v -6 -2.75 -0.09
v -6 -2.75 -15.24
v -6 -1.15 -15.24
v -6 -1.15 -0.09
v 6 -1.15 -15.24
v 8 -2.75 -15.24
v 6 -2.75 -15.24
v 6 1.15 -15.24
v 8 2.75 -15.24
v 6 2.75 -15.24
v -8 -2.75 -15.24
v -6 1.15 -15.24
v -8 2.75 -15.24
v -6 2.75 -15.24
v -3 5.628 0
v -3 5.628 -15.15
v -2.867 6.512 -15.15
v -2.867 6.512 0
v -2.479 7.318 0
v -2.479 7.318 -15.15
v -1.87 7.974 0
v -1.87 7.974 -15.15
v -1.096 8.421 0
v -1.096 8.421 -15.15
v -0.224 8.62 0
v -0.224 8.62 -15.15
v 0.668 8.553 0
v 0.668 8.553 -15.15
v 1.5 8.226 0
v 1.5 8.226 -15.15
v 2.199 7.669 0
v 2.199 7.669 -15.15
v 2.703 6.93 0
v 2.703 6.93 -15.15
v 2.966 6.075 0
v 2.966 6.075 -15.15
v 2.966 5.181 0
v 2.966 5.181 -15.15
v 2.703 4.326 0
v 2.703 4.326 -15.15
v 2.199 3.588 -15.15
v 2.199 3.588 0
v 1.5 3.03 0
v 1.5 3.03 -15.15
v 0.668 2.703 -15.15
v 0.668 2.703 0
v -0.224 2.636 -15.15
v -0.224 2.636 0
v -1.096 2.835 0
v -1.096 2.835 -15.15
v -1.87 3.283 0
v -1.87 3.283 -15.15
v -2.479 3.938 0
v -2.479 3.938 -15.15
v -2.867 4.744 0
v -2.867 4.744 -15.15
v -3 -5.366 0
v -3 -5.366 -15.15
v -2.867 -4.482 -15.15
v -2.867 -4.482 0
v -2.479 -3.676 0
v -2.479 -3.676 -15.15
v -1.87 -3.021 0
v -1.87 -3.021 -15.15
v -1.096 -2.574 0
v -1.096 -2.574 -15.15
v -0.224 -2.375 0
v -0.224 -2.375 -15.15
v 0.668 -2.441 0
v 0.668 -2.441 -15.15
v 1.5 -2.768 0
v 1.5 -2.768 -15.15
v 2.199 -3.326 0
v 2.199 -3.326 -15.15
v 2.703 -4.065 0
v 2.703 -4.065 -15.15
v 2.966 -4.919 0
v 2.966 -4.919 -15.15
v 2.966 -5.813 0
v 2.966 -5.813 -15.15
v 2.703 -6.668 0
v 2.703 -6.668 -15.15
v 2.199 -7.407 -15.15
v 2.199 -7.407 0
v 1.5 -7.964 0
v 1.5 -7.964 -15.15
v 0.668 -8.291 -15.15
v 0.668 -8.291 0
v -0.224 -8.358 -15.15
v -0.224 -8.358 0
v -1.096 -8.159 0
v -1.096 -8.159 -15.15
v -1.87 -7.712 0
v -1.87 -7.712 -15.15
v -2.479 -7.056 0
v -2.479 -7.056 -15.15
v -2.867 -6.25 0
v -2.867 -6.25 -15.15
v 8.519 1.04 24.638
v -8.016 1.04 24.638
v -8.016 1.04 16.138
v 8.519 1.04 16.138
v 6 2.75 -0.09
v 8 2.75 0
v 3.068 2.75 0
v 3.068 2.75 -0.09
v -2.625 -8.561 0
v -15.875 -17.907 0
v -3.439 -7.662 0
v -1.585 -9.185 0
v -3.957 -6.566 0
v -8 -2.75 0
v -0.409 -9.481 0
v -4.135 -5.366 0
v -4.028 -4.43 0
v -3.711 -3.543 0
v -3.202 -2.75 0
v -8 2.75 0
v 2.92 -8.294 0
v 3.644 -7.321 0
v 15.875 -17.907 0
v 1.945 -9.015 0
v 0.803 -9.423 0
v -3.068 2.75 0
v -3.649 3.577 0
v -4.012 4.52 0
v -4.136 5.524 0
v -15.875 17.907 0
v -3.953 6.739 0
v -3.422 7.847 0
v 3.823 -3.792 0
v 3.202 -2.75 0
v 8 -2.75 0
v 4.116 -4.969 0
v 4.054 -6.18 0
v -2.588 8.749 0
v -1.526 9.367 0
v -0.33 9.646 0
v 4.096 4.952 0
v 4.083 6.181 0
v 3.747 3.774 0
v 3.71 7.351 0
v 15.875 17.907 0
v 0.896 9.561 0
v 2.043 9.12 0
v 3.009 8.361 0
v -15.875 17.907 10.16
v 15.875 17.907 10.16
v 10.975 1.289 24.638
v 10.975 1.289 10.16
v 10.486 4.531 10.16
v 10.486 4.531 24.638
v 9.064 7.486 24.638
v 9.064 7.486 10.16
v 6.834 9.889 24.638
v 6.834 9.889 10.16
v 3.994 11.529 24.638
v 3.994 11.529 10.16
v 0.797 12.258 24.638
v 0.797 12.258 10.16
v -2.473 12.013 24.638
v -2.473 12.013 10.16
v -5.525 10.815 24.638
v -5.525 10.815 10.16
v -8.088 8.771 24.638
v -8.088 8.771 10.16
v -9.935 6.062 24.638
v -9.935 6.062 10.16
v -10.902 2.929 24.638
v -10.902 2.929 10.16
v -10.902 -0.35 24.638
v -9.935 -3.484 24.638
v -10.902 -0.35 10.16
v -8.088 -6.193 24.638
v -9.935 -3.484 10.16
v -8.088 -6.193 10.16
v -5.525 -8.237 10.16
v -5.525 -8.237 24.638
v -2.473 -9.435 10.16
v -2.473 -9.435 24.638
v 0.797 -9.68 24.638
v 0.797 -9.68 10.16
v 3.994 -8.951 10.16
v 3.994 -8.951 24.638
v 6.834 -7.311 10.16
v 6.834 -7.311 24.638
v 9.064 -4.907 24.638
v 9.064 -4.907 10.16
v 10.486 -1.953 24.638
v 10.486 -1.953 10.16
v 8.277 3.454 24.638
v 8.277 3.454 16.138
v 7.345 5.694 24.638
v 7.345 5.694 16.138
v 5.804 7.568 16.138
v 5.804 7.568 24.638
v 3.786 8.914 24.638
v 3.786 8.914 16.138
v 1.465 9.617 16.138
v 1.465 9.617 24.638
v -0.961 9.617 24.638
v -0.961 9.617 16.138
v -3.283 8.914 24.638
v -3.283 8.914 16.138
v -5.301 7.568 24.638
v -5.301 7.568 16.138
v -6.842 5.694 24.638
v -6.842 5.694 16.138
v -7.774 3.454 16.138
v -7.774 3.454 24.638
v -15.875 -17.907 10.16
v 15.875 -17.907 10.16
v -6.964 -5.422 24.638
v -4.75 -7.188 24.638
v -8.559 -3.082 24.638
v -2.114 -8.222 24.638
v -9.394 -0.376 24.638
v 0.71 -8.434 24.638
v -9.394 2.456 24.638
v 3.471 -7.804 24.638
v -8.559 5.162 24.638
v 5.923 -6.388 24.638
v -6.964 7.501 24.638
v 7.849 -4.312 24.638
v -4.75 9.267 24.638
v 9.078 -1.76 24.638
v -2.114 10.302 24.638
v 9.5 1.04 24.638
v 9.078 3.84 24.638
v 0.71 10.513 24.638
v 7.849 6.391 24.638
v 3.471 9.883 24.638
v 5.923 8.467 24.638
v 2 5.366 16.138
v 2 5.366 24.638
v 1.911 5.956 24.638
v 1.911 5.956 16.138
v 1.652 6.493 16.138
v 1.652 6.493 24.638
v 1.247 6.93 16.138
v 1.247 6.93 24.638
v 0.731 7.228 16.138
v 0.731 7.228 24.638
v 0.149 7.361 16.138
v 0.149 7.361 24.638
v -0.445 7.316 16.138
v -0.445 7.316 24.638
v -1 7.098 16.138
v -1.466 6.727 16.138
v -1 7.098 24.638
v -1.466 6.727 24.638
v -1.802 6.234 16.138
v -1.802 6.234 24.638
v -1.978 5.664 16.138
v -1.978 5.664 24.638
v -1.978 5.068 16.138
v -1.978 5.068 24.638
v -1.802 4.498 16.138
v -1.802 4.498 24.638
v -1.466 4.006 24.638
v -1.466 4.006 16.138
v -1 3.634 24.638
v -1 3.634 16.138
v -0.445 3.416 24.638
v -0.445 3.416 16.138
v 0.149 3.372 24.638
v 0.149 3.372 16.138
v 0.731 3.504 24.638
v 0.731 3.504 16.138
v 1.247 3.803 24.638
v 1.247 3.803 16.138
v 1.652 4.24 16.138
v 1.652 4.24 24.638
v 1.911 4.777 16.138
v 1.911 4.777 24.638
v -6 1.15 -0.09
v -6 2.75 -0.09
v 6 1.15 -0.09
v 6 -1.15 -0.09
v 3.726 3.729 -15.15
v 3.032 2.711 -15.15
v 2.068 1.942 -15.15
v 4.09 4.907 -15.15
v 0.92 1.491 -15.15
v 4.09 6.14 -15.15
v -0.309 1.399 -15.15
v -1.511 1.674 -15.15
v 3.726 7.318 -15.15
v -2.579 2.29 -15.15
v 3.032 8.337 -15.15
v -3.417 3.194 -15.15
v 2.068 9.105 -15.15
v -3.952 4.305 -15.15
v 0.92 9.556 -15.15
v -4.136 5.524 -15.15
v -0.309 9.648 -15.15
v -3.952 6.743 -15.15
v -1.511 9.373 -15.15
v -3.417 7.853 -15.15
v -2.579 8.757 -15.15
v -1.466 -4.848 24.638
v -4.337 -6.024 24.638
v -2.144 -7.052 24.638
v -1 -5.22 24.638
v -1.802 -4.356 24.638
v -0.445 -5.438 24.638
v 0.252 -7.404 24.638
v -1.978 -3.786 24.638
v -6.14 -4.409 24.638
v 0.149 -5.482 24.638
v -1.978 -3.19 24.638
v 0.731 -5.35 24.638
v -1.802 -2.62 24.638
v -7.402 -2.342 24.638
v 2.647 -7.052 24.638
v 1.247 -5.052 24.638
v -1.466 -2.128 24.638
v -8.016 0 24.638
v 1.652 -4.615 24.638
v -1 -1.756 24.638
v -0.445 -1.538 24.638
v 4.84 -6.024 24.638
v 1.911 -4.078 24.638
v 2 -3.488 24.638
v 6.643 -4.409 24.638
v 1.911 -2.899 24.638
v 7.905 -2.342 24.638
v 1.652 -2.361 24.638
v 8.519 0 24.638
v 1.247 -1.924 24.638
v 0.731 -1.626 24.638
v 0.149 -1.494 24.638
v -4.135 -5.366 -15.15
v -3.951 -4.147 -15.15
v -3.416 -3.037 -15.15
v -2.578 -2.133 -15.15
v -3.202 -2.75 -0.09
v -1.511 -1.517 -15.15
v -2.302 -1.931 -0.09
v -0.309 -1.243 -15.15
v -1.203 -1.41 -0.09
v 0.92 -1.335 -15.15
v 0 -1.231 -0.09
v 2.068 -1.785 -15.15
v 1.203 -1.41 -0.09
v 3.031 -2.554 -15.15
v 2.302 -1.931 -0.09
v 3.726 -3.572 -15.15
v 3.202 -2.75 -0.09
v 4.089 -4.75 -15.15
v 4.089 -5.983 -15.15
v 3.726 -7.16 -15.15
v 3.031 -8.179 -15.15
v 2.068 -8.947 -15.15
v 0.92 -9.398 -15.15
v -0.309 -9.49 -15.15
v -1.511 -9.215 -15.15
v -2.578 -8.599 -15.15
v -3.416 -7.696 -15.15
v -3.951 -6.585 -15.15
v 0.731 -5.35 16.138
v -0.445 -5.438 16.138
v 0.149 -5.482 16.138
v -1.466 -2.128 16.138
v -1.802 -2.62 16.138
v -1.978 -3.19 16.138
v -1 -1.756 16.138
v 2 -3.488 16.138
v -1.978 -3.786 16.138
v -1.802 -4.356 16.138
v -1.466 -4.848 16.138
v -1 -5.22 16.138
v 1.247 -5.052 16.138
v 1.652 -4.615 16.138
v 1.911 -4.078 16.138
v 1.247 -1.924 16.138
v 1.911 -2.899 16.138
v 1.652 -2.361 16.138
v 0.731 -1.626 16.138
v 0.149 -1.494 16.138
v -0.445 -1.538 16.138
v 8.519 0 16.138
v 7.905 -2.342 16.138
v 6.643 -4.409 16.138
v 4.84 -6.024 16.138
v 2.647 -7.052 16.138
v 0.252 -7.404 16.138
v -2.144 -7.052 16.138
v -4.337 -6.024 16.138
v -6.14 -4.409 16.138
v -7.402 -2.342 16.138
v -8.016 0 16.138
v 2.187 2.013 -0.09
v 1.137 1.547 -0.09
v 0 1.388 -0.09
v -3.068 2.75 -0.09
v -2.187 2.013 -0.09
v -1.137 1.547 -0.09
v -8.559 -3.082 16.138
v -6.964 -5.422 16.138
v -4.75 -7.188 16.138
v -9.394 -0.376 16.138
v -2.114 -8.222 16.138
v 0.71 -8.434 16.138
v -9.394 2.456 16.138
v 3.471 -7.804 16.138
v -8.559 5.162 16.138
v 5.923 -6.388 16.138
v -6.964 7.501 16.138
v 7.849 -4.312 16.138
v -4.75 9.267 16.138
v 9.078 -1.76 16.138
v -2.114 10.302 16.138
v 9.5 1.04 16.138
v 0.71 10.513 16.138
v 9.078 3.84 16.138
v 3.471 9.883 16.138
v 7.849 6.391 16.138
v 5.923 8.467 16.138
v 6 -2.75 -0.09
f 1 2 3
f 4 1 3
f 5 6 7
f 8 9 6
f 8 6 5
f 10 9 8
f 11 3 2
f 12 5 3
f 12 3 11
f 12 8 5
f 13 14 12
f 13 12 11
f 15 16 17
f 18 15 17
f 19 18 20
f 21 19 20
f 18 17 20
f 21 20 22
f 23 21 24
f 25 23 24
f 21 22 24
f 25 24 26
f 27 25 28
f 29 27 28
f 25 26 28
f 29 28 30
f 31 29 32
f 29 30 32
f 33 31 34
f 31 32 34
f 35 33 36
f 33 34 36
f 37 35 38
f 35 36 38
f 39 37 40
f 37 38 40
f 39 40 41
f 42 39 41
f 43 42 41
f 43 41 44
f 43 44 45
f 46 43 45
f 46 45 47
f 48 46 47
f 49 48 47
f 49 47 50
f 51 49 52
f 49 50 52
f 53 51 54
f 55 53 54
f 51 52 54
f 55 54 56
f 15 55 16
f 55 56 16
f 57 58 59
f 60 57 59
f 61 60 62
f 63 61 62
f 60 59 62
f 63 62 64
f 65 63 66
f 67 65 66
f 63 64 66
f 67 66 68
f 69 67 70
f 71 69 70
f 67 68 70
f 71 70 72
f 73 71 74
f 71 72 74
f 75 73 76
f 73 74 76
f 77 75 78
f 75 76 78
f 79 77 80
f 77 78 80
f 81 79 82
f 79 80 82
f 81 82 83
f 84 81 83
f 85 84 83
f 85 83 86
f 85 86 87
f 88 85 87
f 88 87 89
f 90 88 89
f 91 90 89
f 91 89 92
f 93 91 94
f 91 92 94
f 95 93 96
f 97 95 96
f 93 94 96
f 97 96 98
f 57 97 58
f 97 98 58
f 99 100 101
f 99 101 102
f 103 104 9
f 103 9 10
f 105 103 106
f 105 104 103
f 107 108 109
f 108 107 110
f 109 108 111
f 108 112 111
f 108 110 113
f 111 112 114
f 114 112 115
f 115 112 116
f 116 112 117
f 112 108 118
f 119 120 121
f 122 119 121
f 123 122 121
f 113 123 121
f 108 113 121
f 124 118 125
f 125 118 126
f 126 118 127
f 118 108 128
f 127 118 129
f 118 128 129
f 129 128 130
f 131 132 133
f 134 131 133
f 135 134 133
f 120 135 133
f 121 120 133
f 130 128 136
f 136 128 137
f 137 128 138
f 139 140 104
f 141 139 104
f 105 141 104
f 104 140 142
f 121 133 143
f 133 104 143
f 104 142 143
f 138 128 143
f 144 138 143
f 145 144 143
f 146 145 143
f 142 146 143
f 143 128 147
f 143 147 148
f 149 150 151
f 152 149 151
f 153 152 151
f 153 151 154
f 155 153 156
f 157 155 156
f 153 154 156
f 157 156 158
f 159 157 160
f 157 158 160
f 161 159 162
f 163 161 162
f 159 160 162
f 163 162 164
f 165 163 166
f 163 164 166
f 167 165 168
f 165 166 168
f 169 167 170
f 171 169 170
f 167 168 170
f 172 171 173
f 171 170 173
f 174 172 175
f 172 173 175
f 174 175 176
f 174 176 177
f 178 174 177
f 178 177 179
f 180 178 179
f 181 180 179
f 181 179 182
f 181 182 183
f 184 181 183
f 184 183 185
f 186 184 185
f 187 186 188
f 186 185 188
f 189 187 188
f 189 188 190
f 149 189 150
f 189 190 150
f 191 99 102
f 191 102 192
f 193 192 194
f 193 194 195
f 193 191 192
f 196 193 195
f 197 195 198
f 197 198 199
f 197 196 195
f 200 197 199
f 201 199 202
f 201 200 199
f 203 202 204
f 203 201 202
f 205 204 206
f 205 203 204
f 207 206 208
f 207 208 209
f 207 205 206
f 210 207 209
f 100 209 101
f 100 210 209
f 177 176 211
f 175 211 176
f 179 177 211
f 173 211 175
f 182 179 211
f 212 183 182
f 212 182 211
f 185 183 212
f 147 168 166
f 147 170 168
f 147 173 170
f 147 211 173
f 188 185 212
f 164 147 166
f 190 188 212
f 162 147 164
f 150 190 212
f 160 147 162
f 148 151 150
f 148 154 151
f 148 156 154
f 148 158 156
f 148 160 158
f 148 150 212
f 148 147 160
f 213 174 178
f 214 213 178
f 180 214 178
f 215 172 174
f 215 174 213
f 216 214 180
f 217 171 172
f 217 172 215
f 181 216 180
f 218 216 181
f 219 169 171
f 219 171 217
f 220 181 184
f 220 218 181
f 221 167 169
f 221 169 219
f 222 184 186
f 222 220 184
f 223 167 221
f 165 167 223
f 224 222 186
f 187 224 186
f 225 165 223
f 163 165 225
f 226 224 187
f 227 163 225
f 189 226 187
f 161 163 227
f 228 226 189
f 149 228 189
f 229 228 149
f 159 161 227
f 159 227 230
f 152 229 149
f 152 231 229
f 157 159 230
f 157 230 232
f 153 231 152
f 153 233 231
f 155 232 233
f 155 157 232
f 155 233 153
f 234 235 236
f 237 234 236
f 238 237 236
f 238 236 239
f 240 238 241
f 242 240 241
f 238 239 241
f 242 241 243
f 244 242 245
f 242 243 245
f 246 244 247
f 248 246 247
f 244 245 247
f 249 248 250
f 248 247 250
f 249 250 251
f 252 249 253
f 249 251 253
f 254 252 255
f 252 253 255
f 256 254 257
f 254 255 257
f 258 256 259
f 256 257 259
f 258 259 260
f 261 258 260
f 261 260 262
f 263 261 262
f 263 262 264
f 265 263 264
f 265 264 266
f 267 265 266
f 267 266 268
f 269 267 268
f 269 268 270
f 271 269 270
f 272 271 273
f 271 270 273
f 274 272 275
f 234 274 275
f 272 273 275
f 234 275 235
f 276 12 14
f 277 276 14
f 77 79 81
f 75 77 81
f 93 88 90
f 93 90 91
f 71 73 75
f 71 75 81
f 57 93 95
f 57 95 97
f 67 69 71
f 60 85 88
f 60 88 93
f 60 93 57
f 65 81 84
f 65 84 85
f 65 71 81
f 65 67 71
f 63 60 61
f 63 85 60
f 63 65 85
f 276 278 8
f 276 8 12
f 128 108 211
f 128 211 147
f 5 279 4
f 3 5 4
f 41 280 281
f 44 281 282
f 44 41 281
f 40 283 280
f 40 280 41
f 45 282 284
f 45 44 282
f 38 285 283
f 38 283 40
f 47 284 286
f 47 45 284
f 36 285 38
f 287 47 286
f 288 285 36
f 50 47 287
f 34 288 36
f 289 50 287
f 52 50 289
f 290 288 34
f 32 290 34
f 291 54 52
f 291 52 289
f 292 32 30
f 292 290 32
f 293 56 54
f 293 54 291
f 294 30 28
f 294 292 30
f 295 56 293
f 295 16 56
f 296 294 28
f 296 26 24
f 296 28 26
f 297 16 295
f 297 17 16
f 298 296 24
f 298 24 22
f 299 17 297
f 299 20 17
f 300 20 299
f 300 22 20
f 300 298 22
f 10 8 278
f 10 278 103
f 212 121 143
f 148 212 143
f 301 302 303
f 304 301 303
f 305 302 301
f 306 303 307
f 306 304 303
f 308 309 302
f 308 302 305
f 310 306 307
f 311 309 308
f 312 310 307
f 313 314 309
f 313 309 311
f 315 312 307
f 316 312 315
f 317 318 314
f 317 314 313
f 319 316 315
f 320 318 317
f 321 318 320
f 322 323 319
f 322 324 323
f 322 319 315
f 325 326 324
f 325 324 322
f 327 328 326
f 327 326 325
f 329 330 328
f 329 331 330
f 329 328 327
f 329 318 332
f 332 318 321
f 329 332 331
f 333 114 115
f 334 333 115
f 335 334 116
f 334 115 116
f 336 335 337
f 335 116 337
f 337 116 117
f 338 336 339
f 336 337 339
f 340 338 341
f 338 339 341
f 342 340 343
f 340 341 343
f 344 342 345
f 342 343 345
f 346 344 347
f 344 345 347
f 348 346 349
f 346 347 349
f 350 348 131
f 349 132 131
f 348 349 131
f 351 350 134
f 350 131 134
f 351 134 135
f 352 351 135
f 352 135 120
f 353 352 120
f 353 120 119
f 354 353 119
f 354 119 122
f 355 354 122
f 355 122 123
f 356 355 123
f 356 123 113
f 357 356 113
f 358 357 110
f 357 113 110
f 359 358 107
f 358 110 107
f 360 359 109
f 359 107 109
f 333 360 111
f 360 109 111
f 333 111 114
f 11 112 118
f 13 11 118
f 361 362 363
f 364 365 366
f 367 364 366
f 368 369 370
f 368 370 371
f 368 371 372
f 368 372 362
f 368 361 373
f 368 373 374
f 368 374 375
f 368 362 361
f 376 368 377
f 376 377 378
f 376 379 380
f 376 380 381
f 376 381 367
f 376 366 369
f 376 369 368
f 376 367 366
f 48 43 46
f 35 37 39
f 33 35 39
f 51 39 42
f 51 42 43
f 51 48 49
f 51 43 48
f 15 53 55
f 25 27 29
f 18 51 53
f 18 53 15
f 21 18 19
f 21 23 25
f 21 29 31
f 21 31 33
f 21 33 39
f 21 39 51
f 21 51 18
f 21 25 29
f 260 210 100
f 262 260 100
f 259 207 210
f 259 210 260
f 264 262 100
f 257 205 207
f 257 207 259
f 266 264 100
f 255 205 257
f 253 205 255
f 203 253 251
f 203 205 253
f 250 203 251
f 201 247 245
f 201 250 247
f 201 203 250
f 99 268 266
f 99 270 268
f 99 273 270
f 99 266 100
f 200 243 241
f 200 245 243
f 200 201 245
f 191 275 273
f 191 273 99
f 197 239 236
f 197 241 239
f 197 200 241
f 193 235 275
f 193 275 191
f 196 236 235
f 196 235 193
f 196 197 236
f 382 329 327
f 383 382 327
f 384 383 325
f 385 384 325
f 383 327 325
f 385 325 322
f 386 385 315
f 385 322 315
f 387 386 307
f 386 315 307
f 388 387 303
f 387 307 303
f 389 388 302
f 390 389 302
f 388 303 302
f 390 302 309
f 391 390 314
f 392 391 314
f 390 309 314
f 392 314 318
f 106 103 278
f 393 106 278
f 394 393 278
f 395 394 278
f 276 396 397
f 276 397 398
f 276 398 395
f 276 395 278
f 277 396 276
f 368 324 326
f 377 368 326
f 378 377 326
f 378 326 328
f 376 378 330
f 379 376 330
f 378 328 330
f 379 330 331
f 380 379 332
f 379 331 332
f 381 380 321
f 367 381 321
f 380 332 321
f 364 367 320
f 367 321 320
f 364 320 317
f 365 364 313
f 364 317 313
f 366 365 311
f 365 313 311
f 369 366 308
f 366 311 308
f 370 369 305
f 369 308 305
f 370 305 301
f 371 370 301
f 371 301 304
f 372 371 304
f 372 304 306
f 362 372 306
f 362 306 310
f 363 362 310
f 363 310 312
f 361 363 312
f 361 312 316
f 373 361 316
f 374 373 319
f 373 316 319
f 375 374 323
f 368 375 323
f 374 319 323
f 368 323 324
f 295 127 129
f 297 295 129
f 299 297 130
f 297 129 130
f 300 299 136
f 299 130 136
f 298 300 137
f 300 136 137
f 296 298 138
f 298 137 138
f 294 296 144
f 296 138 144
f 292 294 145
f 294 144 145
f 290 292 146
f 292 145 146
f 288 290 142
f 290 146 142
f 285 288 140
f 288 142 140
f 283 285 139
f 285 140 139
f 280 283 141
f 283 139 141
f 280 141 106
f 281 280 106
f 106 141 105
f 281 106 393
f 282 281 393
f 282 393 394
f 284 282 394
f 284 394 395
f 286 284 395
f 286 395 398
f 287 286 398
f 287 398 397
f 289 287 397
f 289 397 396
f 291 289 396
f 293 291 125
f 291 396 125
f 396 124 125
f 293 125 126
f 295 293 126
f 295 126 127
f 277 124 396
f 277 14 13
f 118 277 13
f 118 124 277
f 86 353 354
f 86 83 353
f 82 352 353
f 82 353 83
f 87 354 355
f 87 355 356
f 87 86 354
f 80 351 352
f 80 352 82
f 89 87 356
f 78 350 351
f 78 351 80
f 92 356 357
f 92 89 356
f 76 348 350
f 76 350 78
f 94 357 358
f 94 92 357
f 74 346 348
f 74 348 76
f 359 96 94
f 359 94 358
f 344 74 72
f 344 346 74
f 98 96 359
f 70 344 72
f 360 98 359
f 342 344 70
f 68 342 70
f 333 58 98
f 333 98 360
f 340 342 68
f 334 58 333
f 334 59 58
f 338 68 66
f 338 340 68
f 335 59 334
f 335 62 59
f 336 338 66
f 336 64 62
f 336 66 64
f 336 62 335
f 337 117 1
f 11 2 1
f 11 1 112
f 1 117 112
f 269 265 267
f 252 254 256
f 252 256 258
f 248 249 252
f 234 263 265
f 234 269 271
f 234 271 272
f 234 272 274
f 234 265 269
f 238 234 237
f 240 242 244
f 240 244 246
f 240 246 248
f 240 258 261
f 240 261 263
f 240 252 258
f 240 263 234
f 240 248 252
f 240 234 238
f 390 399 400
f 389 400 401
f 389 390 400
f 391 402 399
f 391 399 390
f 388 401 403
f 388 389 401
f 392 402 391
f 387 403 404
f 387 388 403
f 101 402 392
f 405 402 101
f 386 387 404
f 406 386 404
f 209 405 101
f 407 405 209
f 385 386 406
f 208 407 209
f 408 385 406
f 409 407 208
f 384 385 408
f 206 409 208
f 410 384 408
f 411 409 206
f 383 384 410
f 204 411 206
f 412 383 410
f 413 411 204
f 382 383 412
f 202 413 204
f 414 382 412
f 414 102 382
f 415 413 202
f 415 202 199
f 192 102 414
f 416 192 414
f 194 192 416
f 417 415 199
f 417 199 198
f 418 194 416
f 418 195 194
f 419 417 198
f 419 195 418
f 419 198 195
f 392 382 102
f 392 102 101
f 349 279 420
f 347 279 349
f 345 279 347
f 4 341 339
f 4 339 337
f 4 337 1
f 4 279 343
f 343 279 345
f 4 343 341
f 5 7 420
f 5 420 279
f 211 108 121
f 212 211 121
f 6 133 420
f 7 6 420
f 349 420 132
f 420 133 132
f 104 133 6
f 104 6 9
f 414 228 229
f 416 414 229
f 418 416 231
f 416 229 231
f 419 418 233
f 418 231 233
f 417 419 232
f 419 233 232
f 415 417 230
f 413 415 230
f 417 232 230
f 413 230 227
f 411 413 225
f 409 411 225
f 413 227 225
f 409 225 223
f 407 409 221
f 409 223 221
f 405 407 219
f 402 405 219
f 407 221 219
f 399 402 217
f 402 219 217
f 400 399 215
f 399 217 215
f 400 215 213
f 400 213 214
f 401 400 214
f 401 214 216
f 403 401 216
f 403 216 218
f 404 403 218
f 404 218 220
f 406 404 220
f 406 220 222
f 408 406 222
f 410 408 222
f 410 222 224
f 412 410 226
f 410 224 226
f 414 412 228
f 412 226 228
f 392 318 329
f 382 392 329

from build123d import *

# Parameters (mm, degrees)
SKETCH1_W           = 31.75
SKETCH1_H           = 35.814
BOSS_EXTRUDE1_DEPTH = 10.16
SKETCH3_R           = 11
BOSS_EXTRUDE2_DEPTH = 14.478
SKETCH4_W           = 16
SKETCH4_H           = 5.5
BOSS_EXTRUDE3_DEPTH = 15.24
SKETCH5_R           = 9.5
CUT_EXTRUDE1_DEPTH  = 8.5
SKETCH6_R           = 2
CUT_EXTRUDE2_DEPTH  = 8.5
SKETCH7_R           = 2
CUT_EXTRUDE3_DEPTH  = 8.5
SKETCH8_W           = 12
SKETCH8_H           = 1.6
CUT_EXTRUDE4_DEPTH  = 15.15
SKETCH10_W          = 12
SKETCH10_H          = 1.6
CUT_EXTRUDE5_DEPTH  = 15.15
SKETCH12_R          = 4.135780917
BOSS_EXTRUDE4_DEPTH = 15.15
SKETCH13_R          = 3
CUT_EXTRUDE6_DEPTH  = 15.15
SKETCH14_R          = 4.135
BOSS_EXTRUDE5_DEPTH = 15.15
SKETCH15_R          = 3
CUT_EXTRUDE7_DEPTH  = 15.15


with BuildPart() as part:
    # Sketch1 → Boss-Extrude1 (new body)
    with BuildSketch(Plane.XY):
        Rectangle(SKETCH1_W, SKETCH1_H)
    extrude(amount=BOSS_EXTRUDE1_DEPTH)

    # Sketch3 → Boss-Extrude2 (add)
    with BuildSketch(Plane.XY.offset(10.16)):
        with Locations((-0.024824202, 1.289107608)):
            Circle(SKETCH3_R)
    extrude(amount=BOSS_EXTRUDE2_DEPTH)

    # Sketch4 → Boss-Extrude3 (add)
    with BuildSketch(Plane(origin=(0, 0, 0), x_dir=(-1, 0, 0), z_dir=(0, 0, -1))):
        Rectangle(SKETCH4_W, SKETCH4_H)
    extrude(amount=BOSS_EXTRUDE3_DEPTH)

    # Sketch5 → Cut-Extrude1 (cut)
    with BuildSketch(Plane.XY.offset(24.638)):
        with Locations((0, 1.039705526)):
            Circle(SKETCH5_R)
        with BuildLine():
            Line((-8.015794219, 0), (8.518877538, 0))
            ThreePointArc((8.518877538, 0), (0.25154166, -7.404071177), (-8.015794219, 0))
        make_face(mode=Mode.SUBTRACT)
        with BuildLine():
            Line((-8.015794219, 1.039705526), (8.518877538, 1.039705526))
            ThreePointArc((8.518877538, 1.039705526), (0.25154166, 9.706845425), (-8.015794219, 1.039705526))
        make_face(mode=Mode.SUBTRACT)
    extrude(amount=-CUT_EXTRUDE1_DEPTH, mode=Mode.SUBTRACT)

    # Sketch6 → Cut-Extrude2 (cut)
    with BuildSketch(Plane.XY.offset(24.638)):
        with Locations((0, 5.366222071)):
            Circle(SKETCH6_R)
    extrude(amount=-CUT_EXTRUDE2_DEPTH, mode=Mode.SUBTRACT)

    # Sketch7 → Cut-Extrude3 (cut)
    with BuildSketch(Plane.XY.offset(24.638)):
        with Locations((0, -3.488044346)):
            Circle(SKETCH7_R)
    extrude(amount=-CUT_EXTRUDE3_DEPTH, mode=Mode.SUBTRACT)

    # Sketch8 → Cut-Extrude4 (cut)
    with BuildSketch(Plane(origin=(0, 0, -15.24), x_dir=(-1, 0, 0), z_dir=(0, 0, -1))):
        with Locations((0, 1.95)):
            Rectangle(SKETCH8_W, SKETCH8_H)
    extrude(amount=-CUT_EXTRUDE4_DEPTH, mode=Mode.SUBTRACT)

    # Sketch10 → Cut-Extrude5 (cut)
    with BuildSketch(Plane(origin=(0, 0, -15.24), x_dir=(-1, 0, 0), z_dir=(0, 0, -1))):
        with Locations((0, -1.95)):
            Rectangle(SKETCH10_W, SKETCH10_H)
    extrude(amount=-CUT_EXTRUDE5_DEPTH, mode=Mode.SUBTRACT)

    # Sketch12 → Boss-Extrude4 (add)
    with BuildSketch(Plane(origin=(0, 0, 0), x_dir=(-1, 0, 0), z_dir=(0, 0, -1))):
        with Locations((0, 5.523554626)):
            Circle(SKETCH12_R)
    extrude(amount=BOSS_EXTRUDE4_DEPTH)

    # Sketch13 → Cut-Extrude6 (cut)
    with BuildSketch(Plane(origin=(0, 0, -15.15), x_dir=(-1, 0, 0), z_dir=(0, 0, -1))):
        with Locations((0, 5.628086678)):
            Circle(SKETCH13_R)
    extrude(amount=-CUT_EXTRUDE6_DEPTH, mode=Mode.SUBTRACT)

    # Sketch14 → Boss-Extrude5 (add)
    with BuildSketch(Plane(origin=(0, 0, 0), x_dir=(-1, 0, 0), z_dir=(0, 0, -1))):
        with Locations((0, -5.366222071)):
            Circle(SKETCH14_R)
    extrude(amount=BOSS_EXTRUDE5_DEPTH)

    # Sketch15 → Cut-Extrude7 (cut)
    with BuildSketch(Plane(origin=(0, 0, -15.15), x_dir=(-1, 0, 0), z_dir=(0, 0, -1))):
        with Locations((0, -5.366222071)):
            Circle(SKETCH15_R)
    extrude(amount=-CUT_EXTRUDE7_DEPTH, mode=Mode.SUBTRACT)


solid = part.part
